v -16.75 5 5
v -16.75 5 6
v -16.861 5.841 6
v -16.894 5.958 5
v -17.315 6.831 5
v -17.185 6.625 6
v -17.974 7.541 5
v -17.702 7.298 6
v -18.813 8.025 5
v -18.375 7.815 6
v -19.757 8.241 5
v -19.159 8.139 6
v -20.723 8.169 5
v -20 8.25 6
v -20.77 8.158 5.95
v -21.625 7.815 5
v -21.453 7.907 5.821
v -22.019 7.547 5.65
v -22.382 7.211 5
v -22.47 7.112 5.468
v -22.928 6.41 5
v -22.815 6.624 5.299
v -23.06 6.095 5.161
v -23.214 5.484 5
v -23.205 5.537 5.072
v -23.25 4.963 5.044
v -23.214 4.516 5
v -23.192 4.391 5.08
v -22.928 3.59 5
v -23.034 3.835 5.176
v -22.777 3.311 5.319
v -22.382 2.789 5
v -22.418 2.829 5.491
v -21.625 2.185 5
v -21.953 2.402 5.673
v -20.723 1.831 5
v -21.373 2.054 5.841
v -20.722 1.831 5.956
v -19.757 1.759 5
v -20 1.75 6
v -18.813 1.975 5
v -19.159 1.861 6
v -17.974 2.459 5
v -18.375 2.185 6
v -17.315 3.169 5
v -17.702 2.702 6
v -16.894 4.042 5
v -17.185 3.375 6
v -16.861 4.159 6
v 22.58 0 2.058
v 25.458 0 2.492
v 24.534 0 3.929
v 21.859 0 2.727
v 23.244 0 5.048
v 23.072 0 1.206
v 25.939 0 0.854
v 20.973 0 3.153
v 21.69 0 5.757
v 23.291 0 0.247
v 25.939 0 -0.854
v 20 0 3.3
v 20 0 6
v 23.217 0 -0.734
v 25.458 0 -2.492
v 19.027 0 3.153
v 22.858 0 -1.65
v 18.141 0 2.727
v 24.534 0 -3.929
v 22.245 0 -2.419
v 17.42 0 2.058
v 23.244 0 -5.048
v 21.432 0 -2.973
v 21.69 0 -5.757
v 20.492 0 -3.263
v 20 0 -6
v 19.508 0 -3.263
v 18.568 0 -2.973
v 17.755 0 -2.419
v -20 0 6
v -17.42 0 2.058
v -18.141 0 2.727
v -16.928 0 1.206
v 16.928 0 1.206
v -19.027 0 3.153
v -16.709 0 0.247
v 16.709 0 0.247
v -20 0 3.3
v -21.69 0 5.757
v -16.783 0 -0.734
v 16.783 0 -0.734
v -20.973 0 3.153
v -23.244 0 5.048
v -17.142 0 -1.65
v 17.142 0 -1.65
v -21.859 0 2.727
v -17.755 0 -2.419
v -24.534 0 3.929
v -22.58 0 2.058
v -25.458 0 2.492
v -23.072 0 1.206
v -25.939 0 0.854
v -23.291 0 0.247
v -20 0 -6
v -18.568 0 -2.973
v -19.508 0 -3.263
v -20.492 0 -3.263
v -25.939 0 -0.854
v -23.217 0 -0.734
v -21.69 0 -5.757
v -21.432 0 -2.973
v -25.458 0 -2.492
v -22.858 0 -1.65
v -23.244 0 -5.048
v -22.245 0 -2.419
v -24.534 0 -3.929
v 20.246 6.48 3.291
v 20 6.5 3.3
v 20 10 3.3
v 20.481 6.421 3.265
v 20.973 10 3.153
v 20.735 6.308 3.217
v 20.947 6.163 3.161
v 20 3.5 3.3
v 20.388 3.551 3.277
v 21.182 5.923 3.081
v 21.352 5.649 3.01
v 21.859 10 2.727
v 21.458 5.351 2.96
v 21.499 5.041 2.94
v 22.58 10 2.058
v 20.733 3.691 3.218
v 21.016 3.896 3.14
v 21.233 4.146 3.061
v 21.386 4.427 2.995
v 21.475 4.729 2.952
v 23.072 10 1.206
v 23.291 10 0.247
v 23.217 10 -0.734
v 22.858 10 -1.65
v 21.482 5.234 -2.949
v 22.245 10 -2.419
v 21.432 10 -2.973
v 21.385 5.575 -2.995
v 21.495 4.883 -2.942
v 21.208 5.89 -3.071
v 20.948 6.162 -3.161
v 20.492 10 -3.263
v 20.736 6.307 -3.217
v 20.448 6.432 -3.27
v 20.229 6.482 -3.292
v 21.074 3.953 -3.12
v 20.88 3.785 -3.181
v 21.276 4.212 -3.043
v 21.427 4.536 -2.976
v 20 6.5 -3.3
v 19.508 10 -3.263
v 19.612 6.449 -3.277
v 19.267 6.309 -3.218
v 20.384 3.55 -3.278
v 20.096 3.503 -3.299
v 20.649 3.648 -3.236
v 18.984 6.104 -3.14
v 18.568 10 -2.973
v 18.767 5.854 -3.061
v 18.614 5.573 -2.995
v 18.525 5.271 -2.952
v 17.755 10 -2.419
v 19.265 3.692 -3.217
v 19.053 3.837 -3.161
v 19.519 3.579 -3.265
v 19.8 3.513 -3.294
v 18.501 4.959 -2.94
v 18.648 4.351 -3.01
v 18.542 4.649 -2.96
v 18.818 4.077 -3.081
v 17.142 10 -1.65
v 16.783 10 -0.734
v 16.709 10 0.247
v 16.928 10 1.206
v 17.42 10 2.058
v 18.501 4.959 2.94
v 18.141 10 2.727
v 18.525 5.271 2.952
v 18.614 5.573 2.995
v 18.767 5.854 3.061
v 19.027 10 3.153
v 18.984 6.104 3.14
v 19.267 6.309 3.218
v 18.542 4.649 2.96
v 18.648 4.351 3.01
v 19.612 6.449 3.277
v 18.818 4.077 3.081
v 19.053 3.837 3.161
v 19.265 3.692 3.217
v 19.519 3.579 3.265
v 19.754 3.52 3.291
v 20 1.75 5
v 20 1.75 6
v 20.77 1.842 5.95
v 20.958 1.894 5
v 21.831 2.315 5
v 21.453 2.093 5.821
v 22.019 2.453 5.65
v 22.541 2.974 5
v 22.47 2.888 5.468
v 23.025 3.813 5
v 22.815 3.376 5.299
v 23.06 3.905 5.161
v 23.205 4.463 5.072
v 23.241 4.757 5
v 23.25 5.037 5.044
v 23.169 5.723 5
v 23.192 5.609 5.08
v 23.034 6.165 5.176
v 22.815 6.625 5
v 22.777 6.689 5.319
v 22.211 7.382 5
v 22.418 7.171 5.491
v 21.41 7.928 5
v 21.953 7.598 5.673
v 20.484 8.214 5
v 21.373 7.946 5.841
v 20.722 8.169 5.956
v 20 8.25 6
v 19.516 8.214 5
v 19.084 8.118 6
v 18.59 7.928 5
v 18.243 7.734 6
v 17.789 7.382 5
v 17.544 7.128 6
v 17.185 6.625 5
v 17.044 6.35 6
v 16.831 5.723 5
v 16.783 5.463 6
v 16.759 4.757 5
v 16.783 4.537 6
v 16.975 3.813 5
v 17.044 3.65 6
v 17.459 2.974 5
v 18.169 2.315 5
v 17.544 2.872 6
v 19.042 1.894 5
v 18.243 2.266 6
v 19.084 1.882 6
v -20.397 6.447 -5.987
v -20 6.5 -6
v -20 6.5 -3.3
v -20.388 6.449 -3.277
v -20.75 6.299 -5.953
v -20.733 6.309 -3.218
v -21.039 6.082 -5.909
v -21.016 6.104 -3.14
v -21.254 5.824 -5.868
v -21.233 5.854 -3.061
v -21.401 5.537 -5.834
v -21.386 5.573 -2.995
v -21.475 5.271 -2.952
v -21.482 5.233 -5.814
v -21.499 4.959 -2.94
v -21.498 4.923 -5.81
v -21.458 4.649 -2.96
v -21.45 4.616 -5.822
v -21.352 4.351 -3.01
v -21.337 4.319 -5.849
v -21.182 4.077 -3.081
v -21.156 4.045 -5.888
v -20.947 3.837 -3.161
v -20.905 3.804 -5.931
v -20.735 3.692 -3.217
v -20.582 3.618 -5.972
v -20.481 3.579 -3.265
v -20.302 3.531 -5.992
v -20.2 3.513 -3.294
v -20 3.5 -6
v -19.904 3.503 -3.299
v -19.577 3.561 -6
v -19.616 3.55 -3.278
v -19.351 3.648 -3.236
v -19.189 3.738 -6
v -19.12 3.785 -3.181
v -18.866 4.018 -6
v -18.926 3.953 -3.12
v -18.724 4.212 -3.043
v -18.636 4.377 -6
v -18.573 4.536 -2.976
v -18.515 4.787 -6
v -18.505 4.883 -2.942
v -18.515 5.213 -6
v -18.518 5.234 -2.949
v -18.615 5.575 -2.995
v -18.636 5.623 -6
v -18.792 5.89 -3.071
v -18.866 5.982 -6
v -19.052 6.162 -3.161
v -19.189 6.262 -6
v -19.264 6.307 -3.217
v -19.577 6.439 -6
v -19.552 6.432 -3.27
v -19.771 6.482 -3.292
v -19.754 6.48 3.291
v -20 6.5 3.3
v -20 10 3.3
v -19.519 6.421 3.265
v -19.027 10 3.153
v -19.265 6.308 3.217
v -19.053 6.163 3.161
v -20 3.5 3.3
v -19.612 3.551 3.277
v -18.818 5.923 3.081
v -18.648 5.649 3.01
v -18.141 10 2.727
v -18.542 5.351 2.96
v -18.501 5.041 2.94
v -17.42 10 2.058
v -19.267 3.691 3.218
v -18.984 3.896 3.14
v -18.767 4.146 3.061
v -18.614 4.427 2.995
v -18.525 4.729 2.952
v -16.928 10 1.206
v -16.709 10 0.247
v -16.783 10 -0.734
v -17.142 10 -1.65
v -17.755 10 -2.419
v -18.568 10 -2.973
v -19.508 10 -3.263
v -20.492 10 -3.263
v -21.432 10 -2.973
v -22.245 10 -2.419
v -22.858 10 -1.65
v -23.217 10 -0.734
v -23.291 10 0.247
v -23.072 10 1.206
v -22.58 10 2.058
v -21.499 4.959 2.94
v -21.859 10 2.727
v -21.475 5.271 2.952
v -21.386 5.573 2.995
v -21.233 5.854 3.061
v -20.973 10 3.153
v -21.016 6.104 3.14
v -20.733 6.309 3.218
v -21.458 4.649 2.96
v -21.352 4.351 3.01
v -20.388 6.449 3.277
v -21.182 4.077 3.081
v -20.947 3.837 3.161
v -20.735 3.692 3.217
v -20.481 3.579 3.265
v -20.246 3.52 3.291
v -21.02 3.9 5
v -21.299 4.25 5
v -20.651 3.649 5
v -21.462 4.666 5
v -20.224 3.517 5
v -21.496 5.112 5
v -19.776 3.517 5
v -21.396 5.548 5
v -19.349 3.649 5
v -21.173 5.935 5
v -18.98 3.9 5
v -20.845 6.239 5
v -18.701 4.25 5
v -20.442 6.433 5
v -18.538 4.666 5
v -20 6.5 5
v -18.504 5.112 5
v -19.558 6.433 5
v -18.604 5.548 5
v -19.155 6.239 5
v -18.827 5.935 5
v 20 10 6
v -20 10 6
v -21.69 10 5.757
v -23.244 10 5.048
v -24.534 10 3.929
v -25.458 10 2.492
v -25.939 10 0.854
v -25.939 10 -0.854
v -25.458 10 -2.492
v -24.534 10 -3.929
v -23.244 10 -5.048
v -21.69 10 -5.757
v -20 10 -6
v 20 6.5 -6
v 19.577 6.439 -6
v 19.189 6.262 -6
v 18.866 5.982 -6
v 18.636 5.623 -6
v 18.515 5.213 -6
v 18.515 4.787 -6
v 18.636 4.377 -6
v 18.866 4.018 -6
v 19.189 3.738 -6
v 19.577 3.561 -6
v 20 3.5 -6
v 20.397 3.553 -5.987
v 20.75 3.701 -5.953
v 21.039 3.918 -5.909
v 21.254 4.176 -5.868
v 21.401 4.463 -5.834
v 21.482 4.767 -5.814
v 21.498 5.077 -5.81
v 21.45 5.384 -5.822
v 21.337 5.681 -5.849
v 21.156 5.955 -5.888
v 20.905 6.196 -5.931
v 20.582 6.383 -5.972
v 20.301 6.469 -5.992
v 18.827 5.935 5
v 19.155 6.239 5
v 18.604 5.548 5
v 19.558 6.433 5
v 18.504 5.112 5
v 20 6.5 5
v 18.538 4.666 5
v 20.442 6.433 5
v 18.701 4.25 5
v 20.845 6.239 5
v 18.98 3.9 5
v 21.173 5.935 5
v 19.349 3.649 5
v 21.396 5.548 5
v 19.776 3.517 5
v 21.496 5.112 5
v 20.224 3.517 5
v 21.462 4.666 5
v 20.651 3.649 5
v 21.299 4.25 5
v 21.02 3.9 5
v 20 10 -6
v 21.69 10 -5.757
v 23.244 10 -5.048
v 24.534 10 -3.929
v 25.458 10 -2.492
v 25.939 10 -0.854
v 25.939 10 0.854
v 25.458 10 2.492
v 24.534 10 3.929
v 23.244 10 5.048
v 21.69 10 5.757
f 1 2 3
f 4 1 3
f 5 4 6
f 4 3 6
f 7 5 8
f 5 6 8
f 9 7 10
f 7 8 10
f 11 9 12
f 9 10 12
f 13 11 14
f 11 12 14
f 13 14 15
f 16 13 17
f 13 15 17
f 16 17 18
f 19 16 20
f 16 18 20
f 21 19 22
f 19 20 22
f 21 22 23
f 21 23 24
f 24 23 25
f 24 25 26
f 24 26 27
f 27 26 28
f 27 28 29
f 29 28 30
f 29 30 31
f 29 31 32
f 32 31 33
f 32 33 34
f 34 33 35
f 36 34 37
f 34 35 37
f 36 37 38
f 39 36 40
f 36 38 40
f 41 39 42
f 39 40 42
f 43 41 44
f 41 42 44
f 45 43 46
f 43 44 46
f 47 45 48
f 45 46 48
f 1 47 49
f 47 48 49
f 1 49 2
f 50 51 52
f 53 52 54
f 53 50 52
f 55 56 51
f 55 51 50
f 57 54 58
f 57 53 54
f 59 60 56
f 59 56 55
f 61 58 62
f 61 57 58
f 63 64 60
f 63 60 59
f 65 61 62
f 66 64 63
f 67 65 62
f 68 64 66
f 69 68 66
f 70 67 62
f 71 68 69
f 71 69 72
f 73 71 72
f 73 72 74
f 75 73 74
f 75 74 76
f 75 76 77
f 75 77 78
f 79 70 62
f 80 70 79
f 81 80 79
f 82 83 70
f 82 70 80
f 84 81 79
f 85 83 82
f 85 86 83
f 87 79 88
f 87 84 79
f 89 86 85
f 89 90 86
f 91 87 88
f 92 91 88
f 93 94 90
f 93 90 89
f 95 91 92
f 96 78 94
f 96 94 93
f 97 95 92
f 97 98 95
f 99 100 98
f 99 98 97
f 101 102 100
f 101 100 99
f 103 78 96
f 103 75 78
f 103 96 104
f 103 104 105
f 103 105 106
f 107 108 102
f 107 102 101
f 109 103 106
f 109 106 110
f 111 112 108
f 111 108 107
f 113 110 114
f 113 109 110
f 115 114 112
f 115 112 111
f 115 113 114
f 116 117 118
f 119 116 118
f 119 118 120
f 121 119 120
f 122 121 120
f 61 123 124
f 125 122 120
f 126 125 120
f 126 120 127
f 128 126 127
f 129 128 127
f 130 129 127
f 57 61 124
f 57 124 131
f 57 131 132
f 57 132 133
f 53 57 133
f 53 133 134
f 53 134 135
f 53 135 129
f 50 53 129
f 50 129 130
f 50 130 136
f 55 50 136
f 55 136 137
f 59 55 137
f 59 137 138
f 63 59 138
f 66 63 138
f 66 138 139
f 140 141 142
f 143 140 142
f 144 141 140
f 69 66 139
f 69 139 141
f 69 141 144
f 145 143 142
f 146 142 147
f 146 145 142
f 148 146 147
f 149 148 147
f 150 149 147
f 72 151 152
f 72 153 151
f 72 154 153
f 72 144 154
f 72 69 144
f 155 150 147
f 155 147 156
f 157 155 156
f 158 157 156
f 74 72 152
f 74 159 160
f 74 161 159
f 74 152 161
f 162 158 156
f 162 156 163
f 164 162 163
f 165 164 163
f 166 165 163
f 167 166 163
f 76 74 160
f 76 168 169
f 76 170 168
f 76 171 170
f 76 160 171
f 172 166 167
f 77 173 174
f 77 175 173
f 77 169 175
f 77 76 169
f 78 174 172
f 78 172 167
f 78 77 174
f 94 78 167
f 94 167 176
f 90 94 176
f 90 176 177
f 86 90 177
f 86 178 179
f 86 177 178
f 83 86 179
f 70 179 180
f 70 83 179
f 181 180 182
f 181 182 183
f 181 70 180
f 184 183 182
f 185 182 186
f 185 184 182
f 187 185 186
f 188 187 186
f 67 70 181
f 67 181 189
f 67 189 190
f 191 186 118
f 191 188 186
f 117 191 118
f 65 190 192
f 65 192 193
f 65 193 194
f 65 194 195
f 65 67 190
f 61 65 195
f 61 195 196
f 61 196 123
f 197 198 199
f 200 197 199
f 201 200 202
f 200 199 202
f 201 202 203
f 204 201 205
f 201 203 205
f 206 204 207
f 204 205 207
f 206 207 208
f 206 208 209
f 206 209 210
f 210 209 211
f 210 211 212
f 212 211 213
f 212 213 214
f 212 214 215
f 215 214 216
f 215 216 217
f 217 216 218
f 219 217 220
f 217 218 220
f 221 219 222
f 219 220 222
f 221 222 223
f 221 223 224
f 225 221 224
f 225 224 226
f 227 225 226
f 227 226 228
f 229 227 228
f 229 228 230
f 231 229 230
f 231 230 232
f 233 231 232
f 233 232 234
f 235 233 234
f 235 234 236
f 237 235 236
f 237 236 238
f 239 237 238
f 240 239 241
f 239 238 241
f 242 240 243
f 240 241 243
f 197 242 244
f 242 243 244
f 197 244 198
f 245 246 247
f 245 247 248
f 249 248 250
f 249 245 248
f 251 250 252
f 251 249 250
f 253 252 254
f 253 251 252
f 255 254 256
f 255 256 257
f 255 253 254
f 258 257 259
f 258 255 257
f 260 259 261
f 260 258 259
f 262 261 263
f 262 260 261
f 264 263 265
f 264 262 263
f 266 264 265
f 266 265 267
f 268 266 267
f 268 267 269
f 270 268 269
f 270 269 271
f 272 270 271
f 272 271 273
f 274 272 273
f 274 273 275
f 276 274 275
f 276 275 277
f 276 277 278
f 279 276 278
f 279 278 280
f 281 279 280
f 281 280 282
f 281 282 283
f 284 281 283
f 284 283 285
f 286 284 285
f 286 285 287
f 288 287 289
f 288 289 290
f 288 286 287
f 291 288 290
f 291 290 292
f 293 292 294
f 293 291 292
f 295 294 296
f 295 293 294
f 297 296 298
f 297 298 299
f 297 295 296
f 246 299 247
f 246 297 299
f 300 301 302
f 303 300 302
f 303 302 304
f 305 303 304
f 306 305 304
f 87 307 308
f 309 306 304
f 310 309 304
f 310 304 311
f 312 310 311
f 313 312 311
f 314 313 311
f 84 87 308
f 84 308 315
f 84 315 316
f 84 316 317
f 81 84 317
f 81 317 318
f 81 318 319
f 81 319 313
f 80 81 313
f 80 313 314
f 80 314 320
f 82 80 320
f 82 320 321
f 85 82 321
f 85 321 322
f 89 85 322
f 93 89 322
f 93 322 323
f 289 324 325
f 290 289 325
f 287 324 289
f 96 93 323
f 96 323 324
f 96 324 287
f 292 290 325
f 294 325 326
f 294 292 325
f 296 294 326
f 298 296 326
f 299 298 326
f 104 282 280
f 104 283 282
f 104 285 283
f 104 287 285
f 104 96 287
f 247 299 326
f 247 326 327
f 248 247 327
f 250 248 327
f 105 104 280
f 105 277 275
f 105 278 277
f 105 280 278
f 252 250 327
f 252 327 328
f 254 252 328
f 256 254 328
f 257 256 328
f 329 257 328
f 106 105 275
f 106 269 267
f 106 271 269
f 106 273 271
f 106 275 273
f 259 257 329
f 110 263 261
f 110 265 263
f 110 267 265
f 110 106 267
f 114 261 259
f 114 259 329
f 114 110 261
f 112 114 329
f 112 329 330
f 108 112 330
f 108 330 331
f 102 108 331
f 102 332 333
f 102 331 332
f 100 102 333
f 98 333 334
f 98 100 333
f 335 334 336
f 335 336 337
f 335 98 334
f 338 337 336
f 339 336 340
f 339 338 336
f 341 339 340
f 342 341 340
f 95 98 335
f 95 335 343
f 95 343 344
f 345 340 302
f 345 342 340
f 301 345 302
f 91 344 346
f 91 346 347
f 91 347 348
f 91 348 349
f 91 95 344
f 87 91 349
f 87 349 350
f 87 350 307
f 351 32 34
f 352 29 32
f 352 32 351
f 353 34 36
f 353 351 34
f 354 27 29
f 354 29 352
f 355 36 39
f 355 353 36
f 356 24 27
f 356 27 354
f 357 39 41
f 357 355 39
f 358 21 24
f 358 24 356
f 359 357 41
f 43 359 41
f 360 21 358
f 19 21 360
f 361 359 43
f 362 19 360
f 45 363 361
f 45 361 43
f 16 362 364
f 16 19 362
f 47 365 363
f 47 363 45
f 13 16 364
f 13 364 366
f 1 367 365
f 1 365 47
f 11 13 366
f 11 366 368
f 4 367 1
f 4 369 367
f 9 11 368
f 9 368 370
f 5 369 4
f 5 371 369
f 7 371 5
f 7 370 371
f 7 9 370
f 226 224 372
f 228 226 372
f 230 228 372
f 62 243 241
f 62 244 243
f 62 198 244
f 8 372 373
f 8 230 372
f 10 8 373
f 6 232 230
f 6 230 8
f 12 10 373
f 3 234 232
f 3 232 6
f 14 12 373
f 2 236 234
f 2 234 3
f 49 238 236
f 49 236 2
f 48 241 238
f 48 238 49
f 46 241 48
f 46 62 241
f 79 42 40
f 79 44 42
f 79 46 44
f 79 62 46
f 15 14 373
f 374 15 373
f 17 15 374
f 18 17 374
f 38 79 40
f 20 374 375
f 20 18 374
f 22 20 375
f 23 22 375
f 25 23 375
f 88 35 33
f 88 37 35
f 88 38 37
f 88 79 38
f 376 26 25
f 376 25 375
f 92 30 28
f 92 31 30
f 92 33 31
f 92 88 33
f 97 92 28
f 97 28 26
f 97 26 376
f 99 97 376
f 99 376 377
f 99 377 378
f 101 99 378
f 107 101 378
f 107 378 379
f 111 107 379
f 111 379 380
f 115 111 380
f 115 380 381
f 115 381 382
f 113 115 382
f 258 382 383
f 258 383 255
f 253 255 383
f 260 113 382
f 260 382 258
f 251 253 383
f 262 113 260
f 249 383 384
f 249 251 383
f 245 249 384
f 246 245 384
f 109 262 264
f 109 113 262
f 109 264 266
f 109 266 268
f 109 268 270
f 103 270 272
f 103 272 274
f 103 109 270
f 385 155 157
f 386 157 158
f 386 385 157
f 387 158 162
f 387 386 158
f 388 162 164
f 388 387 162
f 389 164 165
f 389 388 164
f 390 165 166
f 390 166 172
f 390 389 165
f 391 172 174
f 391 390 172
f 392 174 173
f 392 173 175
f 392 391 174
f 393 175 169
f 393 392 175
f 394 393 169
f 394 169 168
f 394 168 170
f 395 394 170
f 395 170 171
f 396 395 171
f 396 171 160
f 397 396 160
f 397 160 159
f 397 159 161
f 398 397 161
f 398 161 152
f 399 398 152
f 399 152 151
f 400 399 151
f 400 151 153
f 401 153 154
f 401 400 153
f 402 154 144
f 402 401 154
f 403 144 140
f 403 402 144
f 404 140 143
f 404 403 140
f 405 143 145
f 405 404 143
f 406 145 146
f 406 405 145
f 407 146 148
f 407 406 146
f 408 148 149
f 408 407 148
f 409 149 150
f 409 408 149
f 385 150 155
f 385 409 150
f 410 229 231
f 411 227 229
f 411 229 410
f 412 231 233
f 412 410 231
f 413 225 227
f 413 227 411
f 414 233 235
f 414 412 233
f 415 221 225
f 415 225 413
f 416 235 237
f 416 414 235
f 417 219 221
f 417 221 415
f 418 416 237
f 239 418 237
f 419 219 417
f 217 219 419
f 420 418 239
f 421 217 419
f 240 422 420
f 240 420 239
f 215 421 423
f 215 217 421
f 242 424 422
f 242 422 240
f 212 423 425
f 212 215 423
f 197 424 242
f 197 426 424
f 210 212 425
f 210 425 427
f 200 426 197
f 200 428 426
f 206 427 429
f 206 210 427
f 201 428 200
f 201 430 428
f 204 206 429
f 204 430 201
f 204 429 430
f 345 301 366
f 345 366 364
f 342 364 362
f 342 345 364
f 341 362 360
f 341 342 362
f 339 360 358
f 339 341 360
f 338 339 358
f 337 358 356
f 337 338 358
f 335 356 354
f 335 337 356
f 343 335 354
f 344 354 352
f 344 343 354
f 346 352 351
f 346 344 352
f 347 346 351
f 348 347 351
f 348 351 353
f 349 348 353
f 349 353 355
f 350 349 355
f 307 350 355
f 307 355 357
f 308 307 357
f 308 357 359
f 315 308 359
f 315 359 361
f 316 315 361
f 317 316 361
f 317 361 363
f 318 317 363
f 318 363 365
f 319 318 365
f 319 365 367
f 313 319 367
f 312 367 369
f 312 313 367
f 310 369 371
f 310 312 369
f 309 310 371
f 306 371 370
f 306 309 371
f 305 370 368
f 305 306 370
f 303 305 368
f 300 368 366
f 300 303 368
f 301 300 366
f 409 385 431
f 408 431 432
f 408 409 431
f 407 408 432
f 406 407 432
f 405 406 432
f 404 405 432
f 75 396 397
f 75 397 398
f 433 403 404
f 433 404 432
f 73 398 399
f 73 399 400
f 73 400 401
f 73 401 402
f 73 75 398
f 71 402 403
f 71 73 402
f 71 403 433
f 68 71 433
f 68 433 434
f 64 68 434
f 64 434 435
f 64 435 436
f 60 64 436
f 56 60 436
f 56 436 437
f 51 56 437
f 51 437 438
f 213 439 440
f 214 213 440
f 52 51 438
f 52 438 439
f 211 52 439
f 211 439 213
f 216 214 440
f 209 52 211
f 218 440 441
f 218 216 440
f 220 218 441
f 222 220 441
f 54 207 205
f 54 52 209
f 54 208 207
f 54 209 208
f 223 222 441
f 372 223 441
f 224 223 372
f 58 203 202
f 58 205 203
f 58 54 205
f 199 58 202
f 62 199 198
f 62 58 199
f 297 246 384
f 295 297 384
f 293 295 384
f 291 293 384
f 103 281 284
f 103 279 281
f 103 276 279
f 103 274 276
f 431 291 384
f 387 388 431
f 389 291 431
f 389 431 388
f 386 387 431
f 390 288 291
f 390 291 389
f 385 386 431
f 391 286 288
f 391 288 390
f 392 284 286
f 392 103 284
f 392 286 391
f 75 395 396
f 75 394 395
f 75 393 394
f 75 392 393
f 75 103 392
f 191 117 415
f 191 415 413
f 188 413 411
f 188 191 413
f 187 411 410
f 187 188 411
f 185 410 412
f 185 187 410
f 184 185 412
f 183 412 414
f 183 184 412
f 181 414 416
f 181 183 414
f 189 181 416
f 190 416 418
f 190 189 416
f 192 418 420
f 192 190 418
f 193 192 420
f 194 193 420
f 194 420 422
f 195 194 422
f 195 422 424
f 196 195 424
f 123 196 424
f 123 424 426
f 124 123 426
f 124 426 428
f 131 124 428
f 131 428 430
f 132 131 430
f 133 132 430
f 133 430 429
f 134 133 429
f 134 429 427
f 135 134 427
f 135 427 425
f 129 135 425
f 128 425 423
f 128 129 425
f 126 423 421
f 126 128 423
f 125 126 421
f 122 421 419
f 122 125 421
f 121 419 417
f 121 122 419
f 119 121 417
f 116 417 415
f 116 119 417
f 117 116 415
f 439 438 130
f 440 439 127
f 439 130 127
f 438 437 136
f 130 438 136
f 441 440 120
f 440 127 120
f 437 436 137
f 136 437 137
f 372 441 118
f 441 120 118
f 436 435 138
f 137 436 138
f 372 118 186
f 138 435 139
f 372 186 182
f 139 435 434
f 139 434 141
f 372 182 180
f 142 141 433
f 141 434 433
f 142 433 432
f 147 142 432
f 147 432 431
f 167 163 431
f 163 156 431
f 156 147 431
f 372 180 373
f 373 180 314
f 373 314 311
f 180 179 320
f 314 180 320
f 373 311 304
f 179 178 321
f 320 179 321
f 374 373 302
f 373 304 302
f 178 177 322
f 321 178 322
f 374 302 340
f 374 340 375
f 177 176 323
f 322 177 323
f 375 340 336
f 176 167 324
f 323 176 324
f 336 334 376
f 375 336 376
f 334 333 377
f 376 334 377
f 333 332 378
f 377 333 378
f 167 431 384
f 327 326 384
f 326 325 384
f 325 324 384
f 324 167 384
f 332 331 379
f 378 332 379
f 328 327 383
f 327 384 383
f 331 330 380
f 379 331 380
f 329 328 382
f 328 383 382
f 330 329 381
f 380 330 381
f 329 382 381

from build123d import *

# Parameters (mm, degrees)
SALIENTE_EXTRUIR1_DEPTH    = 10
CROQUIS2_R                 = 3.3
CORTAR_EXTRUIR1_DEPTH      = 29.495613698
CORTAR_EXTRUIR2_DEPTH      = 29.495613698
CORTAR_EXTRUIR2_DEPTH_BACK = 29.495613698
CROQUIS3_R                 = 1.5
CROQUIS4_R                 = 3.25
CORTAR_EXTRUIR3_DEPTH      = 1


with BuildPart() as part:
    # Croquis1 → Saliente-Extruir1 (new body)
    with BuildSketch(Plane(origin=(0, 0, 0), x_dir=(1, 0, 0), z_dir=(0, 1, 0))):
        with BuildLine():
            Line((-20, 6), (20, 6))
            ThreePointArc((20, 6), (26, 0), (20, -6))
            Line((20, -6), (-20, -6))
            ThreePointArc((-20, -6), (-26, 0), (-20, 6))
        make_face()
    extrude(amount=SALIENTE_EXTRUIR1_DEPTH)

    # Croquis2 → Cortar-Extruir1 (cut, through all)
    with BuildSketch(Plane(origin=(0, 0, 0), x_dir=(1, 0, 0), z_dir=(0, 1, 0))):
        with Locations(Location((-20, 0, 0), (0, 0, 270))):
            Circle(CROQUIS2_R)
        with Locations(Location((20, 0, 0), (0, 0, 270))):
            Circle(CROQUIS2_R)
    extrude(amount=CORTAR_EXTRUIR1_DEPTH, mode=Mode.SUBTRACT)

    # Croquis3 → Cortar-Extruir2 (cut, two sides: drawn at the far end of the back side and taken through both)
    with BuildSketch(Plane.XY.offset(-CORTAR_EXTRUIR2_DEPTH_BACK)):
        with Locations(Location((-20, 5, 0), (0, 0, 89.999999997))):
            Circle(CROQUIS3_R)
        with Locations(Location((20, 5, 0), (0, 0, 89.999999997))):
            Circle(CROQUIS3_R)
    extrude(amount=CORTAR_EXTRUIR2_DEPTH + CORTAR_EXTRUIR2_DEPTH_BACK, mode=Mode.SUBTRACT)

    # Croquis4 → Cortar-Extruir3 (cut)
    with BuildSketch(Plane.XY.offset(6)):
        with Locations((-20, 5)):
            Circle(CROQUIS4_R)
        with Locations(Location((20, 5, 0), (0, 0, 270.000000001))):
            Circle(CROQUIS4_R)
    extrude(amount=-CORTAR_EXTRUIR3_DEPTH, mode=Mode.SUBTRACT)


solid = part.part
